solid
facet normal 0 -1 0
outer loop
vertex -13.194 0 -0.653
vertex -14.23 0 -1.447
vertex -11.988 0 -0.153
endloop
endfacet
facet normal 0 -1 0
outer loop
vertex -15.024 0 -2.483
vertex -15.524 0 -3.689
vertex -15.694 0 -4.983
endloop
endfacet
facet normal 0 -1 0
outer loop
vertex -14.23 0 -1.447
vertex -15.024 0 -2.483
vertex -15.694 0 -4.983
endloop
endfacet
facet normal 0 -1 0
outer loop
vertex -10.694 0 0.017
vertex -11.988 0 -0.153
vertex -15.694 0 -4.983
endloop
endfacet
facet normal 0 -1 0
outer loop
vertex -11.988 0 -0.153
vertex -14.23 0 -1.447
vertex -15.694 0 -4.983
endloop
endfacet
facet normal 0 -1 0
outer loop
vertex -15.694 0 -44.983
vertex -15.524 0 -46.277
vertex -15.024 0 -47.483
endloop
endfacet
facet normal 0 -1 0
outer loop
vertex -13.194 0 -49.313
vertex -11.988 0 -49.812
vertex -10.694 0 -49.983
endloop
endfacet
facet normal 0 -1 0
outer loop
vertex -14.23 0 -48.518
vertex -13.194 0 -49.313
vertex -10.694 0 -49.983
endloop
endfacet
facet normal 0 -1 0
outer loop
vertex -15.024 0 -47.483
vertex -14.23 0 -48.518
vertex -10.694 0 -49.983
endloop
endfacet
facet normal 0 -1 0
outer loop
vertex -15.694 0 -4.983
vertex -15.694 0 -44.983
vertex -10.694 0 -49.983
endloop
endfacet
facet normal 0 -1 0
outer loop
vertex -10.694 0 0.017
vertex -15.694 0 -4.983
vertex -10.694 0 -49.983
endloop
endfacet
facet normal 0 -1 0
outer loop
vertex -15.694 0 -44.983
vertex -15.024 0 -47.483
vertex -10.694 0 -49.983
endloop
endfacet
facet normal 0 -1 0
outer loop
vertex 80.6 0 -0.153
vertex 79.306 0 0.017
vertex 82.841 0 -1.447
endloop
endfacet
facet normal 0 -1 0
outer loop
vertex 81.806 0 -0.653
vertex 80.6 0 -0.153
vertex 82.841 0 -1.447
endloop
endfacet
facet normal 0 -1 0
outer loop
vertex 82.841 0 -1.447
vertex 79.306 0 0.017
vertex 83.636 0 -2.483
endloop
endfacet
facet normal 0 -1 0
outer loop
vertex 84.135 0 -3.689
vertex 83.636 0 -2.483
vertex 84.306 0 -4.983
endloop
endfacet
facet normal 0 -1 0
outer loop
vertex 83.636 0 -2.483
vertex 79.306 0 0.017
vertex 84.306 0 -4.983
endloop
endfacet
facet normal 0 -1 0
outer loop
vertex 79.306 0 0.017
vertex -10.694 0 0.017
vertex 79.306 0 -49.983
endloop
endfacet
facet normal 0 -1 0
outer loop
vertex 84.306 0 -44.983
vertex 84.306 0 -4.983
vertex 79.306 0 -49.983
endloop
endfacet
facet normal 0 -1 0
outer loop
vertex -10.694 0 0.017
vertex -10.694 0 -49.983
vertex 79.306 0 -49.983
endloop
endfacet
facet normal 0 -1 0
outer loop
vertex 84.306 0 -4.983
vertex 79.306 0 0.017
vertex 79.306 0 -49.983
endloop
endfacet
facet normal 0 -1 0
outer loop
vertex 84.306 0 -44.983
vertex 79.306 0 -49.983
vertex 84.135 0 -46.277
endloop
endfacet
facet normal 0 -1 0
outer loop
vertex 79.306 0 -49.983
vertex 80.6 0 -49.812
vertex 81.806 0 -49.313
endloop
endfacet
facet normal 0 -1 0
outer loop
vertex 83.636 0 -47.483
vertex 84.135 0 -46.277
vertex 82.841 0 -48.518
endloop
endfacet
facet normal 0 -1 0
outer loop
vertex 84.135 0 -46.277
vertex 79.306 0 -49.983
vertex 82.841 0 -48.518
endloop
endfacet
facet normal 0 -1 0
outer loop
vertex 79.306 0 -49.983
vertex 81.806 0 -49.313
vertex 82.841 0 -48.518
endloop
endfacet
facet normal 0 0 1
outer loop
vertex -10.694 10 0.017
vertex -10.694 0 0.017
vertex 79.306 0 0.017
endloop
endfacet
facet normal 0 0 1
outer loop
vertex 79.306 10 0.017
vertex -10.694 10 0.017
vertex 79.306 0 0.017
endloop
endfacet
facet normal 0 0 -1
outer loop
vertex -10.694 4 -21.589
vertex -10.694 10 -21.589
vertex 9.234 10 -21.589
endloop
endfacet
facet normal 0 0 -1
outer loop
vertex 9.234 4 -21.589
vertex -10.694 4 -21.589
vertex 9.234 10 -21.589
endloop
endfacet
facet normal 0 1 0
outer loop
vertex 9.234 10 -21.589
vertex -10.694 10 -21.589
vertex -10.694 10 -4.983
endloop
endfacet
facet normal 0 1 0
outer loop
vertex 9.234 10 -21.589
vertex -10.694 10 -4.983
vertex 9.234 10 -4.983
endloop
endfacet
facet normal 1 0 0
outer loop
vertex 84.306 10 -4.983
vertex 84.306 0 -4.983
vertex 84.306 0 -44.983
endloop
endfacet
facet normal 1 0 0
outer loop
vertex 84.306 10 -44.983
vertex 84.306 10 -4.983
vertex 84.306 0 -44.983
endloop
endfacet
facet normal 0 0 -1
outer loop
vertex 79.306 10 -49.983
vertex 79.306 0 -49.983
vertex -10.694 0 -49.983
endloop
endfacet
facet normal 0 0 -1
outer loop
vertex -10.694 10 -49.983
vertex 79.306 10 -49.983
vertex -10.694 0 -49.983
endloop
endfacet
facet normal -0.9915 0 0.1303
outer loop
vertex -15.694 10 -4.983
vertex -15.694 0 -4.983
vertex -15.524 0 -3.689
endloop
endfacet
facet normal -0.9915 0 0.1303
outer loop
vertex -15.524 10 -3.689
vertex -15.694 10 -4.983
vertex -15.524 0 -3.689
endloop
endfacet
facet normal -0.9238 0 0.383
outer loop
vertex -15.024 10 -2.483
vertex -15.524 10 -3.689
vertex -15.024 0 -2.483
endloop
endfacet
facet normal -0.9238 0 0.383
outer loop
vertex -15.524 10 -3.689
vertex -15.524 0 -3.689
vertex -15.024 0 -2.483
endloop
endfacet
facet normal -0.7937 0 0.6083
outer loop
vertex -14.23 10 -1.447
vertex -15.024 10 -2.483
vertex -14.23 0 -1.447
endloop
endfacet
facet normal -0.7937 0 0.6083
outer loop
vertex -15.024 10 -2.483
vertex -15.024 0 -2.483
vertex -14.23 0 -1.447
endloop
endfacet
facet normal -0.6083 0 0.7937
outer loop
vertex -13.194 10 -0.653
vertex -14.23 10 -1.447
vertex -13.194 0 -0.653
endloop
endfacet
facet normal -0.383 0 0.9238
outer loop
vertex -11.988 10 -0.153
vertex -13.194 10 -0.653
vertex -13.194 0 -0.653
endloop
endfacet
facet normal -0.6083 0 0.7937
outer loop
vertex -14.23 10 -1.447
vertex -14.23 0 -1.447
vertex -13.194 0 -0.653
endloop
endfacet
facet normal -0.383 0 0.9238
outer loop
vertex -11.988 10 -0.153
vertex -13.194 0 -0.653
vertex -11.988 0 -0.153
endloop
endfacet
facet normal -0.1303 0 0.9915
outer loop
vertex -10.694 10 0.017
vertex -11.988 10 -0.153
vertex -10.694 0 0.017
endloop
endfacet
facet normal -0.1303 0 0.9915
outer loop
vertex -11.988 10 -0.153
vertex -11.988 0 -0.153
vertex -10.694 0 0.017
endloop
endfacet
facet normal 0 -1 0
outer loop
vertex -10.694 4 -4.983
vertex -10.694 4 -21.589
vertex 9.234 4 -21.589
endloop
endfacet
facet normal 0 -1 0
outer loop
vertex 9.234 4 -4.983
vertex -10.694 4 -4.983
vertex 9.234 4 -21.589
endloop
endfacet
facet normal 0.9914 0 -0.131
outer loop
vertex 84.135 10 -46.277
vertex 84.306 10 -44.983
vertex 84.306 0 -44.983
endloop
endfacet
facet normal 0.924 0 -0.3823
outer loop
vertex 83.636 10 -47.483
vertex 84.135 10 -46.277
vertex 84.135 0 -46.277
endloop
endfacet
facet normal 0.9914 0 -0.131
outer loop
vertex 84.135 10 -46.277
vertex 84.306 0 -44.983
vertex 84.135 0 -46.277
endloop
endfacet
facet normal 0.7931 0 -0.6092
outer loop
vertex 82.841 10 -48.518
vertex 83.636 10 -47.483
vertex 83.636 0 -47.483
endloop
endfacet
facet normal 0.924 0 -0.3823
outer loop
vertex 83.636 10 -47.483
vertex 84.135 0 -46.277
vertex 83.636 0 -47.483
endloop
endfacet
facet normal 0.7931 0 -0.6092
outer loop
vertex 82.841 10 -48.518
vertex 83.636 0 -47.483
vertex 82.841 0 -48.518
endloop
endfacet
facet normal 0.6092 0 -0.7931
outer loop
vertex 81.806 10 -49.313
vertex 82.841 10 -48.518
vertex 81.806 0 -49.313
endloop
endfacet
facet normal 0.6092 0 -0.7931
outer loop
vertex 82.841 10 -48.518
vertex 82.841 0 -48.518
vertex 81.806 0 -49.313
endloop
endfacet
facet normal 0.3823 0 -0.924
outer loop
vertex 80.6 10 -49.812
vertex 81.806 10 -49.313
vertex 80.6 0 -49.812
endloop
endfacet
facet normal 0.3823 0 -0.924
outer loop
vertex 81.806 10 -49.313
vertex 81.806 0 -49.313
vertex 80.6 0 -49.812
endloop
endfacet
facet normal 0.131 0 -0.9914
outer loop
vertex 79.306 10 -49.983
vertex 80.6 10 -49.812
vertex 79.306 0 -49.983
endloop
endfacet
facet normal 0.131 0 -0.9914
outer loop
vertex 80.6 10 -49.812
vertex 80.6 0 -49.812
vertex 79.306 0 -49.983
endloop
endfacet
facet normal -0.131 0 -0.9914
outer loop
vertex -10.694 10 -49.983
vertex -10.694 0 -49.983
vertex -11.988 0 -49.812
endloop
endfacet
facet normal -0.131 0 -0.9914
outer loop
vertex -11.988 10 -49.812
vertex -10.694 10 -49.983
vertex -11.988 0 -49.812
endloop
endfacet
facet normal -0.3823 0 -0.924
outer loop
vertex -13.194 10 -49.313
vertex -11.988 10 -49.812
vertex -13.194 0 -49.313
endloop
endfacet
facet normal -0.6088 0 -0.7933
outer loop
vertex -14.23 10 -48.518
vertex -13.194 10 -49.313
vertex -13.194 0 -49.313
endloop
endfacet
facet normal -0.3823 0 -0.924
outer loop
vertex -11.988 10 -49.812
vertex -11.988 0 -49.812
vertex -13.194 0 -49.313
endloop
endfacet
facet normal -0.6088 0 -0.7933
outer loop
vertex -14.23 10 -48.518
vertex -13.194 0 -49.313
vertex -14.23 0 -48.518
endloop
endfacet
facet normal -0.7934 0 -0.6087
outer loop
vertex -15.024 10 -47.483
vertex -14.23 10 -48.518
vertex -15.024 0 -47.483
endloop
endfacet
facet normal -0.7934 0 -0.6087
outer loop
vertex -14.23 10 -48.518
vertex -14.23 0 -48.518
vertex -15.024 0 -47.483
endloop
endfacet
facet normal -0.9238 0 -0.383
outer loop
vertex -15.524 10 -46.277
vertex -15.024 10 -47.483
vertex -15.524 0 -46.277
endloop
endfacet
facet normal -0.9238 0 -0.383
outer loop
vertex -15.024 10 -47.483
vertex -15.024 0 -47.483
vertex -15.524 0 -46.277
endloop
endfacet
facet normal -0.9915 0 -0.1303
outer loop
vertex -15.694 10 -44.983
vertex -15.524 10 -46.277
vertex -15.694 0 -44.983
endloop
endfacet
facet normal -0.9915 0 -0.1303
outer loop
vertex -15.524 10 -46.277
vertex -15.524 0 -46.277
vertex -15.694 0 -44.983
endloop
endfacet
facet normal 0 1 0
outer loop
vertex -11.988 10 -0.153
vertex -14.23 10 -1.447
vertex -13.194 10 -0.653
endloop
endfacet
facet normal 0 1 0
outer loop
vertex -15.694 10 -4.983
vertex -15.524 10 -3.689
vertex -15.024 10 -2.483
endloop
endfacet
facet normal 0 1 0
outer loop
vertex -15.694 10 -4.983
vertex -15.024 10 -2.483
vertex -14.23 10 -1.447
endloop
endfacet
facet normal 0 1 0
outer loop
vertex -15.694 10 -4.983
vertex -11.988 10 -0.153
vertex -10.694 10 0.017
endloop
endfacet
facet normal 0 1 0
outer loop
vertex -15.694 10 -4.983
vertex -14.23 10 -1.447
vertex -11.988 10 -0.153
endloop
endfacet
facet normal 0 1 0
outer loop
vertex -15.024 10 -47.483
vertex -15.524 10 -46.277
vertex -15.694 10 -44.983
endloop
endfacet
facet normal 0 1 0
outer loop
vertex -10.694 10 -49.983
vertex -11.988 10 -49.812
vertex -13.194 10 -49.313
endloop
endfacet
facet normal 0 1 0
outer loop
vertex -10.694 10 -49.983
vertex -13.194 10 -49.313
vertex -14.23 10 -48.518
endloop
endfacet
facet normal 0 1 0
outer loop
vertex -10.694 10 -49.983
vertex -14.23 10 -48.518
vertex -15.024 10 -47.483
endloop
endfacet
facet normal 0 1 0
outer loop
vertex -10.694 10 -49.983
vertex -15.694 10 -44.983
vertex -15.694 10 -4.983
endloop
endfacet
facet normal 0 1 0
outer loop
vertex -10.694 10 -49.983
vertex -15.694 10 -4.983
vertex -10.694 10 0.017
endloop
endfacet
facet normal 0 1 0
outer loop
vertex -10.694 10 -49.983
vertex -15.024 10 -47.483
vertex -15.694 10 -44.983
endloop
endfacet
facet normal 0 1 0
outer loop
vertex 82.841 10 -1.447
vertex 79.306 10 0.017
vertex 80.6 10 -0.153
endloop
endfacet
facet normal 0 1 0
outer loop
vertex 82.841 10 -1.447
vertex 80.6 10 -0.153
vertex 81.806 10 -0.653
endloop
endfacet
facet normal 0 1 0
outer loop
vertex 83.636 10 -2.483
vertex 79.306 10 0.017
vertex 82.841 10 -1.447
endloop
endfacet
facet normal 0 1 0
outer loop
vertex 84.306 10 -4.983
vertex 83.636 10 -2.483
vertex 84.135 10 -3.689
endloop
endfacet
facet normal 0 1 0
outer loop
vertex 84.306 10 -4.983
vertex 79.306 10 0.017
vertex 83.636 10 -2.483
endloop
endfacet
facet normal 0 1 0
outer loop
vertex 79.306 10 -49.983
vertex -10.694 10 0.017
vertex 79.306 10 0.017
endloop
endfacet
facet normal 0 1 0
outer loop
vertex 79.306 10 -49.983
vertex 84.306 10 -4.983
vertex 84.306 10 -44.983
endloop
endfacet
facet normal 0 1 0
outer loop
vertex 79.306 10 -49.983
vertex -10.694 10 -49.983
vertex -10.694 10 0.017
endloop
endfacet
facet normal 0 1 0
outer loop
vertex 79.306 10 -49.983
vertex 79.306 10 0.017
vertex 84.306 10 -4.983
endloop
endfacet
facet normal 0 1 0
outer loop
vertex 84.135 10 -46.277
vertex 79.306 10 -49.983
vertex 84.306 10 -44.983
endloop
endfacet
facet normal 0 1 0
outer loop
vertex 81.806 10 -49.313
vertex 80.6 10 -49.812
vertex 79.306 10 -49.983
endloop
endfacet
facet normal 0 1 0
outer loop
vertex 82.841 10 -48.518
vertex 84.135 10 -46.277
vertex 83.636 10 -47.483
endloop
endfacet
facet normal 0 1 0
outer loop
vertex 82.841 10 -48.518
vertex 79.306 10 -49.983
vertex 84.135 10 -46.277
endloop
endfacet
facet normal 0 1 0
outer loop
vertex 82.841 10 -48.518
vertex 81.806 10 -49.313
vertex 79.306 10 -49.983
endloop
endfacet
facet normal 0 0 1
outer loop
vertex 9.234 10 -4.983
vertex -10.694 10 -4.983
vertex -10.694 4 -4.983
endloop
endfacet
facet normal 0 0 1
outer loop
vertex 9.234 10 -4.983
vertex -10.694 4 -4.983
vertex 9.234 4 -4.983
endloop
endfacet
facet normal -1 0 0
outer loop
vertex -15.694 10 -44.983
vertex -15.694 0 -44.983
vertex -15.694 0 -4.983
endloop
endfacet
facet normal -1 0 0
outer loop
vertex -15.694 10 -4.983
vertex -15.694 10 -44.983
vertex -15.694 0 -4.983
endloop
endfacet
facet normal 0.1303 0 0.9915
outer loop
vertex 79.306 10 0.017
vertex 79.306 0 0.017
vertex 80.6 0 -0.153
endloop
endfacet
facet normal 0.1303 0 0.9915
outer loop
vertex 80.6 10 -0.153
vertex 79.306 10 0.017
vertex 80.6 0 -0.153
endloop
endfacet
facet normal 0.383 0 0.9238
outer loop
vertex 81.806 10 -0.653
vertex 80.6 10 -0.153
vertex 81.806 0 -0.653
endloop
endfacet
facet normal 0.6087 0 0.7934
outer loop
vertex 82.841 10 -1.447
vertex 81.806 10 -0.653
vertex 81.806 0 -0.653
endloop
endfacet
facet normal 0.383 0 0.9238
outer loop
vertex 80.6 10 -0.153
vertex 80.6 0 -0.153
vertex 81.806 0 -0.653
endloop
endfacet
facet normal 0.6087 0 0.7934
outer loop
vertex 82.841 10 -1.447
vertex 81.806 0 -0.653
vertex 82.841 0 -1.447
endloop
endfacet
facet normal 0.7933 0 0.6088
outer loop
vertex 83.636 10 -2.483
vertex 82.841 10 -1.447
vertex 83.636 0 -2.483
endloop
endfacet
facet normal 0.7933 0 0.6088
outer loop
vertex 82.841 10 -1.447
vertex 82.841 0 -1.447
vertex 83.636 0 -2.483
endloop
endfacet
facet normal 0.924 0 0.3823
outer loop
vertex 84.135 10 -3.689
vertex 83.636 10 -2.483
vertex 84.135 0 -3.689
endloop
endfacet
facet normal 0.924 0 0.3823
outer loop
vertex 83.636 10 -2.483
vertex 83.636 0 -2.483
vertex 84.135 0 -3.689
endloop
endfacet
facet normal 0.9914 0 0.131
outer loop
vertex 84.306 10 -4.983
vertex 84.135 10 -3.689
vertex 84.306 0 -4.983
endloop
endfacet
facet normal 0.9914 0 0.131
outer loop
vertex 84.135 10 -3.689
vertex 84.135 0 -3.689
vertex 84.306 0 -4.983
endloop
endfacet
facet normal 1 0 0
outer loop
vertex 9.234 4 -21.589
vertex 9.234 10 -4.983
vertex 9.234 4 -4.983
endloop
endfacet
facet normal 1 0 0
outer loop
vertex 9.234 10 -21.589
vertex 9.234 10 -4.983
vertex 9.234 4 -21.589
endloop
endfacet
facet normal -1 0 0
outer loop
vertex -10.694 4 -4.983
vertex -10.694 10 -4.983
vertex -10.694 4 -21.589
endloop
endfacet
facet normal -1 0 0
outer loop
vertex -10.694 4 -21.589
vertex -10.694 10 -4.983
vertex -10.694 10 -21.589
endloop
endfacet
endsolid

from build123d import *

# Parameters (mm, degrees)
BOSS_EXTRUDE1_DEPTH = 10
SKETCH2_W           = 19.927758229
SKETCH2_H           = 16.606465191
BOSS_EXTRUDE2_DEPTH = 6


with BuildPart() as part:
    # Sketch1 → Boss-Extrude1 (new body)
    with BuildSketch(Plane(origin=(0, 0, 0), x_dir=(1, 0, 0), z_dir=(0, 1, 0))):
        with BuildLine():
            Line((79.305838263, 49.982687997), (-10.694161737, 49.982687997))
            ThreePointArc((-10.694161737, 49.982687997), (-14.229695643, 48.518221903), (-15.694161737, 44.982687997))
            Line((-15.694161737, 44.982687997), (-15.694161737, 4.982687997))
            ThreePointArc((-15.694161737, 4.982687997), (-14.229695643, 1.447154091), (-10.694161737, -0.017312003))
            Line((-10.694161737, -0.017312003), (79.305838263, -0.017312003))
            ThreePointArc((79.305838263, -0.017312003), (82.841372169, 1.447154091), (84.305838263, 4.982687997))
            Line((84.305838263, 4.982687997), (84.305838263, 44.982687997))
            ThreePointArc((84.305838263, 44.982687997), (82.841372169, 48.518221903), (79.305838263, 49.982687997))
        make_face()
    extrude(amount=BOSS_EXTRUDE1_DEPTH)


with BuildPart() as body_2:
    # Sketch2 → Boss-Extrude2 (new body)
    with BuildSketch(Plane(origin=(0, 10, 0), x_dir=(1, 0, 0), z_dir=(0, 1, 0))):
        with Locations((-0.730282622, 13.285920593)):
            Rectangle(SKETCH2_W, SKETCH2_H)
    extrude(amount=-BOSS_EXTRUDE2_DEPTH)


solid = Compound([part.part, body_2.part])
